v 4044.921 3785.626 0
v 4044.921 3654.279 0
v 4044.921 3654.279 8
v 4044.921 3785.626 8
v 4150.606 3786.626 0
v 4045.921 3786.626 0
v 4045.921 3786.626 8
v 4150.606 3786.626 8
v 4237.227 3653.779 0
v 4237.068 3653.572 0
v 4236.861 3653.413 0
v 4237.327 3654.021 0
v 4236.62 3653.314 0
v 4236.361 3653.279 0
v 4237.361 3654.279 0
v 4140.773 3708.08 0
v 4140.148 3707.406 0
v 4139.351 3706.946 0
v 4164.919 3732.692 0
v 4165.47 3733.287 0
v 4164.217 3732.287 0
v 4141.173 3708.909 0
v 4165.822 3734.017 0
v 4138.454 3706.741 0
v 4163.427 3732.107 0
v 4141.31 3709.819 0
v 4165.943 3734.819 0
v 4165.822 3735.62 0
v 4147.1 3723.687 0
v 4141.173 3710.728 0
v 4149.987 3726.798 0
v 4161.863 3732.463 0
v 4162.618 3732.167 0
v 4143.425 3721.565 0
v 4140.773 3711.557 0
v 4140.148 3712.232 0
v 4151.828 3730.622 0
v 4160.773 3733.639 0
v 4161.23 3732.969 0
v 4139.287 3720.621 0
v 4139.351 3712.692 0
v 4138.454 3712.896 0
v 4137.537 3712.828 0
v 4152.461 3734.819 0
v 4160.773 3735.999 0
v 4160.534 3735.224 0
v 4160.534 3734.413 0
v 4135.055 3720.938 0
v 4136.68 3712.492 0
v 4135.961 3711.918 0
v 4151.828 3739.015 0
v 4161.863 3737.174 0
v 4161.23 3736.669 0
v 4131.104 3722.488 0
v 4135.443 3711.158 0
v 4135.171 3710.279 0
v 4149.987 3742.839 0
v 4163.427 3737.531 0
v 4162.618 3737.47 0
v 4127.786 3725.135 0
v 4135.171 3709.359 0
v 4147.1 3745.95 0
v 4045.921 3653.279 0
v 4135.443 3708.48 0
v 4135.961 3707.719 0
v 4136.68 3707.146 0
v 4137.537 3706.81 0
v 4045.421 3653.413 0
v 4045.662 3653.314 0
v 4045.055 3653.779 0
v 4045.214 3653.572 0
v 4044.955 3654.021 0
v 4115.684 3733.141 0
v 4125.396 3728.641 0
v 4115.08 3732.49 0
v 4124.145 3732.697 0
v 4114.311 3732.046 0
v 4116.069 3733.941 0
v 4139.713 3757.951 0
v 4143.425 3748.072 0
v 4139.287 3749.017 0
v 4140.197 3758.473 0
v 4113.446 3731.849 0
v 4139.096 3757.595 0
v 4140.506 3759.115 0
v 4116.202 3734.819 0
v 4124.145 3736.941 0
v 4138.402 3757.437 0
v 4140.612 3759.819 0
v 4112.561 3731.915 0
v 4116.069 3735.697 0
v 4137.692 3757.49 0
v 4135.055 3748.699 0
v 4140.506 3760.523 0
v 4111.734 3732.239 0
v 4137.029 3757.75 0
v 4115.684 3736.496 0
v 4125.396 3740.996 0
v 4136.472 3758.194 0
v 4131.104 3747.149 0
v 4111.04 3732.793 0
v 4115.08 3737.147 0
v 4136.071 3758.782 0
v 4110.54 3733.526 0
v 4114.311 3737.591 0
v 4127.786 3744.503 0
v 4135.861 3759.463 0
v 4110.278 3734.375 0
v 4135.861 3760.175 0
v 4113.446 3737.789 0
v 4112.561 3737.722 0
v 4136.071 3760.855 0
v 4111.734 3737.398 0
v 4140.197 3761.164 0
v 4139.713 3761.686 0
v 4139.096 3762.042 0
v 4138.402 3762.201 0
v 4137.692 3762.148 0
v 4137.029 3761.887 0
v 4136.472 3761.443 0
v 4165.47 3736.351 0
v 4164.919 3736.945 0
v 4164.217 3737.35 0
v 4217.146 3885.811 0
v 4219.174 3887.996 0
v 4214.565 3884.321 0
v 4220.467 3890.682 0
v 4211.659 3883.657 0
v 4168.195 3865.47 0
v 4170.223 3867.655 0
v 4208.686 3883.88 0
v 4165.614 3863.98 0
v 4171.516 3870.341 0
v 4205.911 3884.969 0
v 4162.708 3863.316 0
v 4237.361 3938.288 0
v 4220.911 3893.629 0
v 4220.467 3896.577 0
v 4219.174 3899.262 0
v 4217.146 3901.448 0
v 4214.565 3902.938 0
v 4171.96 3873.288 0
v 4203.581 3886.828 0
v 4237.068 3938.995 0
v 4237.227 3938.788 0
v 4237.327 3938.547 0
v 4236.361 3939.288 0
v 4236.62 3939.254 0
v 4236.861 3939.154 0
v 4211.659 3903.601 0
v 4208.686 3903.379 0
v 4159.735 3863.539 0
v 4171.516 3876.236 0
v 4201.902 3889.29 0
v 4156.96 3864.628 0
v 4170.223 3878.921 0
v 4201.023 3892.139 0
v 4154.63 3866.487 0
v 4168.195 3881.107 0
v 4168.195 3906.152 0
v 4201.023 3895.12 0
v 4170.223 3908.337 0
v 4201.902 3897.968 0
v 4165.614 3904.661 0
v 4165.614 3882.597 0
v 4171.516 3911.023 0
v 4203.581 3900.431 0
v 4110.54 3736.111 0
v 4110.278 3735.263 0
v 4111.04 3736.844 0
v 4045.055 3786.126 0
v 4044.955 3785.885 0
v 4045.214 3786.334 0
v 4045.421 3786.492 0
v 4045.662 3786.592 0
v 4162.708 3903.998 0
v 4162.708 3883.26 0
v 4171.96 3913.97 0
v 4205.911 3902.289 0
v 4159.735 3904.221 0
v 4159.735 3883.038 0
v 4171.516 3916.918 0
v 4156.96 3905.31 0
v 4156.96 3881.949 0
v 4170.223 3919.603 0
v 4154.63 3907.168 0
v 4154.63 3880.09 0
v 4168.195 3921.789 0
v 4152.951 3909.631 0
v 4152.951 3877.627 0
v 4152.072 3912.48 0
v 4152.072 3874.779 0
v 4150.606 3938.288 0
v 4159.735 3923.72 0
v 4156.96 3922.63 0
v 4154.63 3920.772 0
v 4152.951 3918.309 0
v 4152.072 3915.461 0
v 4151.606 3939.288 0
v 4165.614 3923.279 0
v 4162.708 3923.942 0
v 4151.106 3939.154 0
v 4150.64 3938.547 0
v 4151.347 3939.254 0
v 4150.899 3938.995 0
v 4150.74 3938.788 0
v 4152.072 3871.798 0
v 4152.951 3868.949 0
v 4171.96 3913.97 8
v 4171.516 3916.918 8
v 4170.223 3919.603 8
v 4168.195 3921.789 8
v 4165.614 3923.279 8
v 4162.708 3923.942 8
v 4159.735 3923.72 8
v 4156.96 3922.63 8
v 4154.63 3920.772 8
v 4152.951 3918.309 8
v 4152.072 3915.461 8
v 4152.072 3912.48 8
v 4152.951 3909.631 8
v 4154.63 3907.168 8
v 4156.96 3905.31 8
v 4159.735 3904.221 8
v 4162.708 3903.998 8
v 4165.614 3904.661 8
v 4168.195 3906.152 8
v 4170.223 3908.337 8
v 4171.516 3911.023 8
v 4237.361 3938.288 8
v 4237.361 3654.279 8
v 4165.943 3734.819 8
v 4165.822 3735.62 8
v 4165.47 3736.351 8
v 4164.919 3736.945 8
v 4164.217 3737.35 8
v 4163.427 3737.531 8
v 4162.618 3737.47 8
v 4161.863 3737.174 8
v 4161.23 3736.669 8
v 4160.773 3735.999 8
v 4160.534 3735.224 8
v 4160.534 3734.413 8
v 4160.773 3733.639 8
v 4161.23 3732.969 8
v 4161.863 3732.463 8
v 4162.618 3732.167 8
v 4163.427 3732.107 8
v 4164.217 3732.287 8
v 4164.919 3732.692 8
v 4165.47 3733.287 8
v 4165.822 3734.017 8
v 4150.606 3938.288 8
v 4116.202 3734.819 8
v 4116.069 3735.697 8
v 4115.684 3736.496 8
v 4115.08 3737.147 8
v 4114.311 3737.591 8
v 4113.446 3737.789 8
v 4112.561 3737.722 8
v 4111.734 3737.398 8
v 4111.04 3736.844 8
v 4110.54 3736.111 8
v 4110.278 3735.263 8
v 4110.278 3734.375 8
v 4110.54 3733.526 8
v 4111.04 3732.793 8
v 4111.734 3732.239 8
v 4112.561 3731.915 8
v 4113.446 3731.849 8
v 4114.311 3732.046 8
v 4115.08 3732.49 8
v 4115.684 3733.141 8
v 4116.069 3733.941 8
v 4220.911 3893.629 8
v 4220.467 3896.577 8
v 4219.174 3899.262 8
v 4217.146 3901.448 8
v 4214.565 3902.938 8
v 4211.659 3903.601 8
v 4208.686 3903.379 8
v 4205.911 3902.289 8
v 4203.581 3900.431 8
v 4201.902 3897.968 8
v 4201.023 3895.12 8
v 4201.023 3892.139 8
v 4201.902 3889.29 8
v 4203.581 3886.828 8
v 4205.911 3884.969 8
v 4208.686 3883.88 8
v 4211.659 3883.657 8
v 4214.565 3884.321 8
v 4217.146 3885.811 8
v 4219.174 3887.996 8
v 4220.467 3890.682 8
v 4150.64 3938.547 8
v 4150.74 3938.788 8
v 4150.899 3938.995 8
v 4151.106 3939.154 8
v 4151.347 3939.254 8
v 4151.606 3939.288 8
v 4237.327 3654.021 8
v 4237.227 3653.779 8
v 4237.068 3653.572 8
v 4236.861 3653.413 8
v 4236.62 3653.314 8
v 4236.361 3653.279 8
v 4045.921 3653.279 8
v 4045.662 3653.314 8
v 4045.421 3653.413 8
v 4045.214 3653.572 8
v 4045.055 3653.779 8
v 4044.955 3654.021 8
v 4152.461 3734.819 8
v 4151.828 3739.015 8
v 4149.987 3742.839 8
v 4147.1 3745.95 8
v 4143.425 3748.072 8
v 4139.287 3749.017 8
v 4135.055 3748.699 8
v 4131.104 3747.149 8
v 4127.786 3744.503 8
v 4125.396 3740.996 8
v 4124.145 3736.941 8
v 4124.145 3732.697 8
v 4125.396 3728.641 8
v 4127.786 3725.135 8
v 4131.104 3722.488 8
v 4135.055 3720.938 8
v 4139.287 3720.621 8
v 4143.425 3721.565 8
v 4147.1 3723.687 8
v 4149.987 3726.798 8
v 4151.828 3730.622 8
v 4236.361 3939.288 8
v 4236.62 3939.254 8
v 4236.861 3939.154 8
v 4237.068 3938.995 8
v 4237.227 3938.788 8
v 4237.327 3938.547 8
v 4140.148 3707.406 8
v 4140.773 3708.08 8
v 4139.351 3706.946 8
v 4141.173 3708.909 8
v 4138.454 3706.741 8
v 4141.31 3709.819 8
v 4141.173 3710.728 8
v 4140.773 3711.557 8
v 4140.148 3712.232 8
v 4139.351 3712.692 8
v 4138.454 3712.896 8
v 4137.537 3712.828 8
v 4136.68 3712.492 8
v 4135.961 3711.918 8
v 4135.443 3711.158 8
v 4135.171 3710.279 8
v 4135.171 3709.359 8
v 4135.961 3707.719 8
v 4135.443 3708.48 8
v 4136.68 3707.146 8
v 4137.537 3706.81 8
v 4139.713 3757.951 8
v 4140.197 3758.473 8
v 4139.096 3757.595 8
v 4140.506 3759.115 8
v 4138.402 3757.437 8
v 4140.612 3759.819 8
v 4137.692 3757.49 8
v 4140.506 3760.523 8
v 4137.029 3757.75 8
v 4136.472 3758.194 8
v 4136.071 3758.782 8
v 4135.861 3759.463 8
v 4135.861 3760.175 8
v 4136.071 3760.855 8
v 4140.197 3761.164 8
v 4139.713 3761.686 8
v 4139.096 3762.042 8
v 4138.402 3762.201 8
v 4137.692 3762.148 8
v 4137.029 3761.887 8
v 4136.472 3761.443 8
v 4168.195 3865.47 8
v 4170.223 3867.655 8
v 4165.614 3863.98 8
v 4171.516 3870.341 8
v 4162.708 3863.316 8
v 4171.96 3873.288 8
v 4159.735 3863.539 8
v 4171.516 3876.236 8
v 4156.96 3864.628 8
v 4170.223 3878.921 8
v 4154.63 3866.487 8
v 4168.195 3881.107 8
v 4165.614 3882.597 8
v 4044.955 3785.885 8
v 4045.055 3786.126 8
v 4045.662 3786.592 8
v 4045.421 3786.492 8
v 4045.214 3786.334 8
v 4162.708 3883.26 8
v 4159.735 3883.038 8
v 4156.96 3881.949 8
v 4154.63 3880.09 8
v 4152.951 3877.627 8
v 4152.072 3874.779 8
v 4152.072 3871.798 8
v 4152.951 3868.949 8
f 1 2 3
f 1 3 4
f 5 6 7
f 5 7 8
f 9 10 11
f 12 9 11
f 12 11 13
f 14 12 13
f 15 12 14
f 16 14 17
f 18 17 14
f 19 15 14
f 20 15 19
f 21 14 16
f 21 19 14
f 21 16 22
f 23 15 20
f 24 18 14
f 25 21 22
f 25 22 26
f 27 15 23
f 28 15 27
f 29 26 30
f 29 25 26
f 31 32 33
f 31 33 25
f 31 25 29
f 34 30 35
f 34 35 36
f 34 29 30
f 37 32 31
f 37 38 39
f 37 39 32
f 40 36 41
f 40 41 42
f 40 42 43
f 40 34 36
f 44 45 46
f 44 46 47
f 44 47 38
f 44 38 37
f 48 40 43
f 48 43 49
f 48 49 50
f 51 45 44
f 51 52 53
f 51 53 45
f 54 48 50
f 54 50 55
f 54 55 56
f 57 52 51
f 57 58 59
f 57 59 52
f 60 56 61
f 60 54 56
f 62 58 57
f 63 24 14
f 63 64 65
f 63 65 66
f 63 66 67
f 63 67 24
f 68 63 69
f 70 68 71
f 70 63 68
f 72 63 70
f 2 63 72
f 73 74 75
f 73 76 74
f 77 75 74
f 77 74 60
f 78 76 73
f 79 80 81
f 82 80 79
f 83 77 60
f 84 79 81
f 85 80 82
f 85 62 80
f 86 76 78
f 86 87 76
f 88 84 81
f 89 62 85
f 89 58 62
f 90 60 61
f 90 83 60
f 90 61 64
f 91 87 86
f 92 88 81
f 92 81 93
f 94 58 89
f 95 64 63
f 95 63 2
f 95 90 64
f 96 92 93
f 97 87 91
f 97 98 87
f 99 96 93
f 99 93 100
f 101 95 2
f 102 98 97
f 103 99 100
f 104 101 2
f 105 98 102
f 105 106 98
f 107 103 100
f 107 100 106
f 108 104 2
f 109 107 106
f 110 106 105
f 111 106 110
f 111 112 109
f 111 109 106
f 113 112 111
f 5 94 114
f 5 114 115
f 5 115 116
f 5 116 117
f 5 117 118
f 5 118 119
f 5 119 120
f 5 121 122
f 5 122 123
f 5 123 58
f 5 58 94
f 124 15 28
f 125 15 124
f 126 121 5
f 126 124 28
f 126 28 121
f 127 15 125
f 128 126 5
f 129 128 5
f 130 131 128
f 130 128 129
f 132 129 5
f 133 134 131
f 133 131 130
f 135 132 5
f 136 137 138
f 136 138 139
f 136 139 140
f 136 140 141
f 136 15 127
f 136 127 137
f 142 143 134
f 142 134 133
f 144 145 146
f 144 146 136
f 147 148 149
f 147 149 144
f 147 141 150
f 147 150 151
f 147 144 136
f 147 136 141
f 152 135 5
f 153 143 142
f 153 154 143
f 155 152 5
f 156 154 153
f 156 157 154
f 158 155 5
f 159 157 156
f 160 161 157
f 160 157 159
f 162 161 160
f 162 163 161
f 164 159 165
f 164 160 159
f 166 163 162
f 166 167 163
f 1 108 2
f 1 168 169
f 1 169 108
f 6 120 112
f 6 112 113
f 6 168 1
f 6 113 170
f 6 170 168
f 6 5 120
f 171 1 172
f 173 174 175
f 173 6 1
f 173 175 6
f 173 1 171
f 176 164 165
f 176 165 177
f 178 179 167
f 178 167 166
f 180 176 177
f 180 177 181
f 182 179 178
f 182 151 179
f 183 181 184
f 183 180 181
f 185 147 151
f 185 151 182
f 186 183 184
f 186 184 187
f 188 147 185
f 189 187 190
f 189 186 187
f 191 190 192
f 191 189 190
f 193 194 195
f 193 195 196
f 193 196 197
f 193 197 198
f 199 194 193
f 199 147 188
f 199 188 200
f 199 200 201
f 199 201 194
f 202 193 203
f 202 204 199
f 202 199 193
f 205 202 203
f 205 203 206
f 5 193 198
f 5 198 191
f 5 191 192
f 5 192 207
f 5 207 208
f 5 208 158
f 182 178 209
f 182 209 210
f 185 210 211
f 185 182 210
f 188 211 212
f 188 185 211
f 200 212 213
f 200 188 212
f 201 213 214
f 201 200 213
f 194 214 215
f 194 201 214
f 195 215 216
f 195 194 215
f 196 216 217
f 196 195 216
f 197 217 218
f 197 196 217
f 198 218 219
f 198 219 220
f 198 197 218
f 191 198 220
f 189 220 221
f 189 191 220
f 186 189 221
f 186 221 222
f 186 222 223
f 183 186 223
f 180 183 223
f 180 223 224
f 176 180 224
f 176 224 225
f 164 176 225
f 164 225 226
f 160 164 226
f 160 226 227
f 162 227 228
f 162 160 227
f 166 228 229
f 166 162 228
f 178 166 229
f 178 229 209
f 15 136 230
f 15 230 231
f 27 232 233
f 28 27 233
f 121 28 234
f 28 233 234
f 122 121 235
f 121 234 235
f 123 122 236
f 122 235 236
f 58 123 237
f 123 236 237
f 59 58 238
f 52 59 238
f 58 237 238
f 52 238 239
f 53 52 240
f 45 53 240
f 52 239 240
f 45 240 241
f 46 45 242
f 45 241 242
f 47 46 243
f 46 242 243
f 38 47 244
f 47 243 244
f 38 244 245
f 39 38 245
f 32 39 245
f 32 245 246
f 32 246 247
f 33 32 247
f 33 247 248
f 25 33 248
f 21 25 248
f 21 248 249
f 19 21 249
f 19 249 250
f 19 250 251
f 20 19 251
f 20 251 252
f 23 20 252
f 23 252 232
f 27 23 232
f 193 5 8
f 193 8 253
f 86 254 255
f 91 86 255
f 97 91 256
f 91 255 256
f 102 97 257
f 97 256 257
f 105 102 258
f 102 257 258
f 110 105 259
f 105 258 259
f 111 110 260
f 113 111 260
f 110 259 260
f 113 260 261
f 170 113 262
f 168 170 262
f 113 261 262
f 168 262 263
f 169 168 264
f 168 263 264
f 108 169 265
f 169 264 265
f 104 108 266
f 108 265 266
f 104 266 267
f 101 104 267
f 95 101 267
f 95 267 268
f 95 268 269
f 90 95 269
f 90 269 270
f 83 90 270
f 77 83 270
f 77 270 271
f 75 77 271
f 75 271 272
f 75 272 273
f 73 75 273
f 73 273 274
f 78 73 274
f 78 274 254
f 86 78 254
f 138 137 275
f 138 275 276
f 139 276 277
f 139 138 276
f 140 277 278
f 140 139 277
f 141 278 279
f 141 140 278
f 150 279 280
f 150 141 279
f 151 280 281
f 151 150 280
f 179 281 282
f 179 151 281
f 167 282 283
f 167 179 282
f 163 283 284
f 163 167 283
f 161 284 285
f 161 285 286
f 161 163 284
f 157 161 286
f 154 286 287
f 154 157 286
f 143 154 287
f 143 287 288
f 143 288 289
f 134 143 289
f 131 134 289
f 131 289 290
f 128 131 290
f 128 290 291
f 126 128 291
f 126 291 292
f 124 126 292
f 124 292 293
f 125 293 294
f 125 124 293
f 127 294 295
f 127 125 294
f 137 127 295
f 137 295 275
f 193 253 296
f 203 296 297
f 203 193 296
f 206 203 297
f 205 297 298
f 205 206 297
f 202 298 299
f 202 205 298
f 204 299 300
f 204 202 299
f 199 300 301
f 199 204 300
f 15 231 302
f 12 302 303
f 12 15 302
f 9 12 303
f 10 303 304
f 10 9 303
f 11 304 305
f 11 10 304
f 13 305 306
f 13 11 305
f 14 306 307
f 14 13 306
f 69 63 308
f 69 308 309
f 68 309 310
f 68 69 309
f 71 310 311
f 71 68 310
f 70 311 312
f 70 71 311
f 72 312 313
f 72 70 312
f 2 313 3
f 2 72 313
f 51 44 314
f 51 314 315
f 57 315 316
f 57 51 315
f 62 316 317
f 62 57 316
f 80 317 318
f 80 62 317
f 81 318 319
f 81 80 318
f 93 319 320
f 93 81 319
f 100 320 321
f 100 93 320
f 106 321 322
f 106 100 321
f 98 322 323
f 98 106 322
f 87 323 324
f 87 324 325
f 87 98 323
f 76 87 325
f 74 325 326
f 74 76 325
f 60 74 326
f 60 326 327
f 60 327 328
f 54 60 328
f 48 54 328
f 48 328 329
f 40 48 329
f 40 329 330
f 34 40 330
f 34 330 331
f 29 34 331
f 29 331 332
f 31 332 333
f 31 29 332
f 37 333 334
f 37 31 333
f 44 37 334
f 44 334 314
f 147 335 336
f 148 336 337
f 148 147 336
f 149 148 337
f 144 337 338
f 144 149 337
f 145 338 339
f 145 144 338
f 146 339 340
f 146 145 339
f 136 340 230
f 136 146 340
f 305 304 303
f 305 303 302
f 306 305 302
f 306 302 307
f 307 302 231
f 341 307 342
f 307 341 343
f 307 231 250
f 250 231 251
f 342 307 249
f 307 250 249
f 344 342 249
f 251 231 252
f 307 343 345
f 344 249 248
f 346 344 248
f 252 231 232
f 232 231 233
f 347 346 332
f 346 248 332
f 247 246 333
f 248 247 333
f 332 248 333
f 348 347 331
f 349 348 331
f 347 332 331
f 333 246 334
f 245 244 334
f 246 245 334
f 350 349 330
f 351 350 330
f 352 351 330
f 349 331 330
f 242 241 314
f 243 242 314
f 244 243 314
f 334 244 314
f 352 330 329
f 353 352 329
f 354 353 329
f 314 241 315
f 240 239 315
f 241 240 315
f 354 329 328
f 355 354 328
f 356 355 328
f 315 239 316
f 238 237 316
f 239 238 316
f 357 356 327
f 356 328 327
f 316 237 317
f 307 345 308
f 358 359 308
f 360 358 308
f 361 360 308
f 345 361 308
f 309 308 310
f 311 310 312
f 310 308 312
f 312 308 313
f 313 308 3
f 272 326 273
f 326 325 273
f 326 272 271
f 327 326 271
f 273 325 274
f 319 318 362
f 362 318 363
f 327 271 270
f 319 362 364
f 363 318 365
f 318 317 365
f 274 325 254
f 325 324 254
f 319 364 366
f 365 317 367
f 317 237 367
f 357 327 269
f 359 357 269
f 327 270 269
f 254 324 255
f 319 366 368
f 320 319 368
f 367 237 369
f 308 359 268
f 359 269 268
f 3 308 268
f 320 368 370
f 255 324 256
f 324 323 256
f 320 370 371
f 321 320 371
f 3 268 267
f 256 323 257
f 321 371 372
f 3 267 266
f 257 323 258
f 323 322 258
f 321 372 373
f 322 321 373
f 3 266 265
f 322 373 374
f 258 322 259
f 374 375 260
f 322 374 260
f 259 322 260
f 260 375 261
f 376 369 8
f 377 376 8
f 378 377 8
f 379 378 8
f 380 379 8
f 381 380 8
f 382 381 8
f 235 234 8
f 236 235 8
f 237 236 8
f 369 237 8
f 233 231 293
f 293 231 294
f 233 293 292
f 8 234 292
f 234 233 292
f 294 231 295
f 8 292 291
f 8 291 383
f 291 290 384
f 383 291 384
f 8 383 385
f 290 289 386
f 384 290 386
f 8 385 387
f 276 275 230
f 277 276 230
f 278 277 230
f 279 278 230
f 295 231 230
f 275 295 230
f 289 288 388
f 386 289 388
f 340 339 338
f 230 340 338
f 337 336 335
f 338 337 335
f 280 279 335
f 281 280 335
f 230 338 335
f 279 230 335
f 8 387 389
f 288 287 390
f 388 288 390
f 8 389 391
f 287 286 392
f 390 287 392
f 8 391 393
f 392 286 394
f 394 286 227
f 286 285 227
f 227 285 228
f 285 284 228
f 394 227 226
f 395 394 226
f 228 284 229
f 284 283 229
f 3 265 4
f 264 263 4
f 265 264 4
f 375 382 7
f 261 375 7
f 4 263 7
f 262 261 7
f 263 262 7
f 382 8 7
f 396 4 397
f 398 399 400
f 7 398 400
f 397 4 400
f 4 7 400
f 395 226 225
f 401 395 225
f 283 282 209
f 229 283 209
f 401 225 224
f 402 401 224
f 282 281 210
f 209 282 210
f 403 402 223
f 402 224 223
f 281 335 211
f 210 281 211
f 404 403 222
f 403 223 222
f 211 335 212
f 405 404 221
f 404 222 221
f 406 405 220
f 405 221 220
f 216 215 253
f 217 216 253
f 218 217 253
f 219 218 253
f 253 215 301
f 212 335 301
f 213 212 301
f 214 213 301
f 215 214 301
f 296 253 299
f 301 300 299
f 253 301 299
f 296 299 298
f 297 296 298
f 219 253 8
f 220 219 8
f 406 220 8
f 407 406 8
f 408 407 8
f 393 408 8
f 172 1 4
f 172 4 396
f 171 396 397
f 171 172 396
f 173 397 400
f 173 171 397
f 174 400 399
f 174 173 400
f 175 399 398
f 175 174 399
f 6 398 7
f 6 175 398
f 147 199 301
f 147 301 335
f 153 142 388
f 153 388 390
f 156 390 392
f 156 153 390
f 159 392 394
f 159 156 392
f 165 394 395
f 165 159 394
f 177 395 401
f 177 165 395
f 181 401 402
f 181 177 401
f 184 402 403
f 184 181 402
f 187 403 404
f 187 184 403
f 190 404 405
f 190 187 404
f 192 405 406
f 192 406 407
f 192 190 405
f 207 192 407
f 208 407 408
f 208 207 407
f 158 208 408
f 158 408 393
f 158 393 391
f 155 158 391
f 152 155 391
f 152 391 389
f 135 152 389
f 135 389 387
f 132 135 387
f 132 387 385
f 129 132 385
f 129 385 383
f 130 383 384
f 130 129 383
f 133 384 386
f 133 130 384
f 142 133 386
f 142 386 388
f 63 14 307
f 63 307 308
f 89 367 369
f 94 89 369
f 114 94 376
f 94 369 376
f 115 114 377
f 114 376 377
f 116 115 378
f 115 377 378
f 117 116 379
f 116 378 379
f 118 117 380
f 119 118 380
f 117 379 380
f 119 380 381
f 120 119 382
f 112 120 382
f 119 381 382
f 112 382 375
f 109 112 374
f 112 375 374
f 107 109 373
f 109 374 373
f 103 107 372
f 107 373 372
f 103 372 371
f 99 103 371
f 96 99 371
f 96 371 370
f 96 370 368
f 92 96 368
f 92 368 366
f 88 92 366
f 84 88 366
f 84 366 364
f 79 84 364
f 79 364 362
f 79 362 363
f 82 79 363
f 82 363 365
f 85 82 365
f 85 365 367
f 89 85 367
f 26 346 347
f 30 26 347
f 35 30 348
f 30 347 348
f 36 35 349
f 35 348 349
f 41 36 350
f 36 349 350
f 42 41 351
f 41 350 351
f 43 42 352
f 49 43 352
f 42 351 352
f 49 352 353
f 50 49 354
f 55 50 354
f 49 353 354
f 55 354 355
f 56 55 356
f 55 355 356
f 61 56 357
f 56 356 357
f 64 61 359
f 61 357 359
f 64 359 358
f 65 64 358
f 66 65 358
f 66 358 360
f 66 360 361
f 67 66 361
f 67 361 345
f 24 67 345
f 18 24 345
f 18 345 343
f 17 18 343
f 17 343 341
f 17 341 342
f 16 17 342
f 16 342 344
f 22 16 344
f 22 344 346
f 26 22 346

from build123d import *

# Parameters (mm, degrees)
SKETCH_1_R          = 10
SKETCH_1_R_2        = 14.237670301
EXTRUDE_1_DEPTH     = 8
SKETCH_2_R          = 2.388792686
SKETCH_2_R_2        = 2.719652574
SKETCH_2_R_3        = 3.086328998
SKETCH_2_R_4        = 2.978260763
CUT_EXTRUDE_1_DEPTH = 9


with BuildPart() as part:
    # 草图1 → 凸台-拉伸1 (new body)
    with BuildSketch(Plane.XY):
        with BuildLine():
            Line((4236.361201479, 3653.279497209), (4045.920724491, 3653.279497209))
            ThreePointArc((4045.920724491, 3653.279497209), (4045.21361771, 3653.572390428), (4044.920724491, 3654.279497209))
            Line((4044.920724491, 3654.279497209), (4044.920724491, 3785.62643227))
            ThreePointArc((4044.920724491, 3785.62643227), (4045.21361771, 3786.333539051), (4045.920724491, 3786.62643227))
            Line((4045.920724491, 3786.62643227), (4150.606085218, 3786.62643227))
            Line((4150.606085218, 3786.62643227), (4150.606085218, 3938.288234625))
            ThreePointArc((4150.606085218, 3938.288234625), (4150.898978436, 3938.995341406), (4151.606085218, 3939.288234625))
            Line((4151.606085218, 3939.288234625), (4236.361201479, 3939.288234625))
            ThreePointArc((4236.361201479, 3939.288234625), (4237.06830826, 3938.995341406), (4237.361201479, 3938.288234625))
            Line((4237.361201479, 3938.288234625), (4237.361201479, 3654.279497209))
            ThreePointArc((4237.361201479, 3654.279497209), (4237.06830826, 3653.572390428), (4236.361201479, 3653.279497209))
        make_face()
        with Locations((4210.911253899, 3893.629242063)):
            Circle(SKETCH_1_R, mode=Mode.SUBTRACT)
        with Locations((4161.960456262, 3913.970224185)):
            Circle(SKETCH_1_R, mode=Mode.SUBTRACT)
        with Locations((4161.960456262, 3873.288259941)):
            Circle(SKETCH_1_R, mode=Mode.SUBTRACT)
        with Locations((4138.223317867, 3734.818667022)):
            Circle(SKETCH_1_R_2, mode=Mode.SUBTRACT)
    extrude(amount=EXTRUDE_1_DEPTH)

    # 草图2 → 切除-拉伸1 (cut, through all)
    with BuildSketch(Plane.XY.offset(8)):
        with Locations((4138.223317867, 3759.818667022)):
            Circle(SKETCH_2_R)
        with Locations((4163.223317867, 3734.818667022)):
            Circle(SKETCH_2_R_2)
        with Locations((4138.223317867, 3709.818667022)):
            Circle(SKETCH_2_R_3)
        with Locations((4113.223317867, 3734.818667022)):
            Circle(SKETCH_2_R_4)
    extrude(amount=-CUT_EXTRUDE_1_DEPTH, mode=Mode.SUBTRACT)


solid = part.part
